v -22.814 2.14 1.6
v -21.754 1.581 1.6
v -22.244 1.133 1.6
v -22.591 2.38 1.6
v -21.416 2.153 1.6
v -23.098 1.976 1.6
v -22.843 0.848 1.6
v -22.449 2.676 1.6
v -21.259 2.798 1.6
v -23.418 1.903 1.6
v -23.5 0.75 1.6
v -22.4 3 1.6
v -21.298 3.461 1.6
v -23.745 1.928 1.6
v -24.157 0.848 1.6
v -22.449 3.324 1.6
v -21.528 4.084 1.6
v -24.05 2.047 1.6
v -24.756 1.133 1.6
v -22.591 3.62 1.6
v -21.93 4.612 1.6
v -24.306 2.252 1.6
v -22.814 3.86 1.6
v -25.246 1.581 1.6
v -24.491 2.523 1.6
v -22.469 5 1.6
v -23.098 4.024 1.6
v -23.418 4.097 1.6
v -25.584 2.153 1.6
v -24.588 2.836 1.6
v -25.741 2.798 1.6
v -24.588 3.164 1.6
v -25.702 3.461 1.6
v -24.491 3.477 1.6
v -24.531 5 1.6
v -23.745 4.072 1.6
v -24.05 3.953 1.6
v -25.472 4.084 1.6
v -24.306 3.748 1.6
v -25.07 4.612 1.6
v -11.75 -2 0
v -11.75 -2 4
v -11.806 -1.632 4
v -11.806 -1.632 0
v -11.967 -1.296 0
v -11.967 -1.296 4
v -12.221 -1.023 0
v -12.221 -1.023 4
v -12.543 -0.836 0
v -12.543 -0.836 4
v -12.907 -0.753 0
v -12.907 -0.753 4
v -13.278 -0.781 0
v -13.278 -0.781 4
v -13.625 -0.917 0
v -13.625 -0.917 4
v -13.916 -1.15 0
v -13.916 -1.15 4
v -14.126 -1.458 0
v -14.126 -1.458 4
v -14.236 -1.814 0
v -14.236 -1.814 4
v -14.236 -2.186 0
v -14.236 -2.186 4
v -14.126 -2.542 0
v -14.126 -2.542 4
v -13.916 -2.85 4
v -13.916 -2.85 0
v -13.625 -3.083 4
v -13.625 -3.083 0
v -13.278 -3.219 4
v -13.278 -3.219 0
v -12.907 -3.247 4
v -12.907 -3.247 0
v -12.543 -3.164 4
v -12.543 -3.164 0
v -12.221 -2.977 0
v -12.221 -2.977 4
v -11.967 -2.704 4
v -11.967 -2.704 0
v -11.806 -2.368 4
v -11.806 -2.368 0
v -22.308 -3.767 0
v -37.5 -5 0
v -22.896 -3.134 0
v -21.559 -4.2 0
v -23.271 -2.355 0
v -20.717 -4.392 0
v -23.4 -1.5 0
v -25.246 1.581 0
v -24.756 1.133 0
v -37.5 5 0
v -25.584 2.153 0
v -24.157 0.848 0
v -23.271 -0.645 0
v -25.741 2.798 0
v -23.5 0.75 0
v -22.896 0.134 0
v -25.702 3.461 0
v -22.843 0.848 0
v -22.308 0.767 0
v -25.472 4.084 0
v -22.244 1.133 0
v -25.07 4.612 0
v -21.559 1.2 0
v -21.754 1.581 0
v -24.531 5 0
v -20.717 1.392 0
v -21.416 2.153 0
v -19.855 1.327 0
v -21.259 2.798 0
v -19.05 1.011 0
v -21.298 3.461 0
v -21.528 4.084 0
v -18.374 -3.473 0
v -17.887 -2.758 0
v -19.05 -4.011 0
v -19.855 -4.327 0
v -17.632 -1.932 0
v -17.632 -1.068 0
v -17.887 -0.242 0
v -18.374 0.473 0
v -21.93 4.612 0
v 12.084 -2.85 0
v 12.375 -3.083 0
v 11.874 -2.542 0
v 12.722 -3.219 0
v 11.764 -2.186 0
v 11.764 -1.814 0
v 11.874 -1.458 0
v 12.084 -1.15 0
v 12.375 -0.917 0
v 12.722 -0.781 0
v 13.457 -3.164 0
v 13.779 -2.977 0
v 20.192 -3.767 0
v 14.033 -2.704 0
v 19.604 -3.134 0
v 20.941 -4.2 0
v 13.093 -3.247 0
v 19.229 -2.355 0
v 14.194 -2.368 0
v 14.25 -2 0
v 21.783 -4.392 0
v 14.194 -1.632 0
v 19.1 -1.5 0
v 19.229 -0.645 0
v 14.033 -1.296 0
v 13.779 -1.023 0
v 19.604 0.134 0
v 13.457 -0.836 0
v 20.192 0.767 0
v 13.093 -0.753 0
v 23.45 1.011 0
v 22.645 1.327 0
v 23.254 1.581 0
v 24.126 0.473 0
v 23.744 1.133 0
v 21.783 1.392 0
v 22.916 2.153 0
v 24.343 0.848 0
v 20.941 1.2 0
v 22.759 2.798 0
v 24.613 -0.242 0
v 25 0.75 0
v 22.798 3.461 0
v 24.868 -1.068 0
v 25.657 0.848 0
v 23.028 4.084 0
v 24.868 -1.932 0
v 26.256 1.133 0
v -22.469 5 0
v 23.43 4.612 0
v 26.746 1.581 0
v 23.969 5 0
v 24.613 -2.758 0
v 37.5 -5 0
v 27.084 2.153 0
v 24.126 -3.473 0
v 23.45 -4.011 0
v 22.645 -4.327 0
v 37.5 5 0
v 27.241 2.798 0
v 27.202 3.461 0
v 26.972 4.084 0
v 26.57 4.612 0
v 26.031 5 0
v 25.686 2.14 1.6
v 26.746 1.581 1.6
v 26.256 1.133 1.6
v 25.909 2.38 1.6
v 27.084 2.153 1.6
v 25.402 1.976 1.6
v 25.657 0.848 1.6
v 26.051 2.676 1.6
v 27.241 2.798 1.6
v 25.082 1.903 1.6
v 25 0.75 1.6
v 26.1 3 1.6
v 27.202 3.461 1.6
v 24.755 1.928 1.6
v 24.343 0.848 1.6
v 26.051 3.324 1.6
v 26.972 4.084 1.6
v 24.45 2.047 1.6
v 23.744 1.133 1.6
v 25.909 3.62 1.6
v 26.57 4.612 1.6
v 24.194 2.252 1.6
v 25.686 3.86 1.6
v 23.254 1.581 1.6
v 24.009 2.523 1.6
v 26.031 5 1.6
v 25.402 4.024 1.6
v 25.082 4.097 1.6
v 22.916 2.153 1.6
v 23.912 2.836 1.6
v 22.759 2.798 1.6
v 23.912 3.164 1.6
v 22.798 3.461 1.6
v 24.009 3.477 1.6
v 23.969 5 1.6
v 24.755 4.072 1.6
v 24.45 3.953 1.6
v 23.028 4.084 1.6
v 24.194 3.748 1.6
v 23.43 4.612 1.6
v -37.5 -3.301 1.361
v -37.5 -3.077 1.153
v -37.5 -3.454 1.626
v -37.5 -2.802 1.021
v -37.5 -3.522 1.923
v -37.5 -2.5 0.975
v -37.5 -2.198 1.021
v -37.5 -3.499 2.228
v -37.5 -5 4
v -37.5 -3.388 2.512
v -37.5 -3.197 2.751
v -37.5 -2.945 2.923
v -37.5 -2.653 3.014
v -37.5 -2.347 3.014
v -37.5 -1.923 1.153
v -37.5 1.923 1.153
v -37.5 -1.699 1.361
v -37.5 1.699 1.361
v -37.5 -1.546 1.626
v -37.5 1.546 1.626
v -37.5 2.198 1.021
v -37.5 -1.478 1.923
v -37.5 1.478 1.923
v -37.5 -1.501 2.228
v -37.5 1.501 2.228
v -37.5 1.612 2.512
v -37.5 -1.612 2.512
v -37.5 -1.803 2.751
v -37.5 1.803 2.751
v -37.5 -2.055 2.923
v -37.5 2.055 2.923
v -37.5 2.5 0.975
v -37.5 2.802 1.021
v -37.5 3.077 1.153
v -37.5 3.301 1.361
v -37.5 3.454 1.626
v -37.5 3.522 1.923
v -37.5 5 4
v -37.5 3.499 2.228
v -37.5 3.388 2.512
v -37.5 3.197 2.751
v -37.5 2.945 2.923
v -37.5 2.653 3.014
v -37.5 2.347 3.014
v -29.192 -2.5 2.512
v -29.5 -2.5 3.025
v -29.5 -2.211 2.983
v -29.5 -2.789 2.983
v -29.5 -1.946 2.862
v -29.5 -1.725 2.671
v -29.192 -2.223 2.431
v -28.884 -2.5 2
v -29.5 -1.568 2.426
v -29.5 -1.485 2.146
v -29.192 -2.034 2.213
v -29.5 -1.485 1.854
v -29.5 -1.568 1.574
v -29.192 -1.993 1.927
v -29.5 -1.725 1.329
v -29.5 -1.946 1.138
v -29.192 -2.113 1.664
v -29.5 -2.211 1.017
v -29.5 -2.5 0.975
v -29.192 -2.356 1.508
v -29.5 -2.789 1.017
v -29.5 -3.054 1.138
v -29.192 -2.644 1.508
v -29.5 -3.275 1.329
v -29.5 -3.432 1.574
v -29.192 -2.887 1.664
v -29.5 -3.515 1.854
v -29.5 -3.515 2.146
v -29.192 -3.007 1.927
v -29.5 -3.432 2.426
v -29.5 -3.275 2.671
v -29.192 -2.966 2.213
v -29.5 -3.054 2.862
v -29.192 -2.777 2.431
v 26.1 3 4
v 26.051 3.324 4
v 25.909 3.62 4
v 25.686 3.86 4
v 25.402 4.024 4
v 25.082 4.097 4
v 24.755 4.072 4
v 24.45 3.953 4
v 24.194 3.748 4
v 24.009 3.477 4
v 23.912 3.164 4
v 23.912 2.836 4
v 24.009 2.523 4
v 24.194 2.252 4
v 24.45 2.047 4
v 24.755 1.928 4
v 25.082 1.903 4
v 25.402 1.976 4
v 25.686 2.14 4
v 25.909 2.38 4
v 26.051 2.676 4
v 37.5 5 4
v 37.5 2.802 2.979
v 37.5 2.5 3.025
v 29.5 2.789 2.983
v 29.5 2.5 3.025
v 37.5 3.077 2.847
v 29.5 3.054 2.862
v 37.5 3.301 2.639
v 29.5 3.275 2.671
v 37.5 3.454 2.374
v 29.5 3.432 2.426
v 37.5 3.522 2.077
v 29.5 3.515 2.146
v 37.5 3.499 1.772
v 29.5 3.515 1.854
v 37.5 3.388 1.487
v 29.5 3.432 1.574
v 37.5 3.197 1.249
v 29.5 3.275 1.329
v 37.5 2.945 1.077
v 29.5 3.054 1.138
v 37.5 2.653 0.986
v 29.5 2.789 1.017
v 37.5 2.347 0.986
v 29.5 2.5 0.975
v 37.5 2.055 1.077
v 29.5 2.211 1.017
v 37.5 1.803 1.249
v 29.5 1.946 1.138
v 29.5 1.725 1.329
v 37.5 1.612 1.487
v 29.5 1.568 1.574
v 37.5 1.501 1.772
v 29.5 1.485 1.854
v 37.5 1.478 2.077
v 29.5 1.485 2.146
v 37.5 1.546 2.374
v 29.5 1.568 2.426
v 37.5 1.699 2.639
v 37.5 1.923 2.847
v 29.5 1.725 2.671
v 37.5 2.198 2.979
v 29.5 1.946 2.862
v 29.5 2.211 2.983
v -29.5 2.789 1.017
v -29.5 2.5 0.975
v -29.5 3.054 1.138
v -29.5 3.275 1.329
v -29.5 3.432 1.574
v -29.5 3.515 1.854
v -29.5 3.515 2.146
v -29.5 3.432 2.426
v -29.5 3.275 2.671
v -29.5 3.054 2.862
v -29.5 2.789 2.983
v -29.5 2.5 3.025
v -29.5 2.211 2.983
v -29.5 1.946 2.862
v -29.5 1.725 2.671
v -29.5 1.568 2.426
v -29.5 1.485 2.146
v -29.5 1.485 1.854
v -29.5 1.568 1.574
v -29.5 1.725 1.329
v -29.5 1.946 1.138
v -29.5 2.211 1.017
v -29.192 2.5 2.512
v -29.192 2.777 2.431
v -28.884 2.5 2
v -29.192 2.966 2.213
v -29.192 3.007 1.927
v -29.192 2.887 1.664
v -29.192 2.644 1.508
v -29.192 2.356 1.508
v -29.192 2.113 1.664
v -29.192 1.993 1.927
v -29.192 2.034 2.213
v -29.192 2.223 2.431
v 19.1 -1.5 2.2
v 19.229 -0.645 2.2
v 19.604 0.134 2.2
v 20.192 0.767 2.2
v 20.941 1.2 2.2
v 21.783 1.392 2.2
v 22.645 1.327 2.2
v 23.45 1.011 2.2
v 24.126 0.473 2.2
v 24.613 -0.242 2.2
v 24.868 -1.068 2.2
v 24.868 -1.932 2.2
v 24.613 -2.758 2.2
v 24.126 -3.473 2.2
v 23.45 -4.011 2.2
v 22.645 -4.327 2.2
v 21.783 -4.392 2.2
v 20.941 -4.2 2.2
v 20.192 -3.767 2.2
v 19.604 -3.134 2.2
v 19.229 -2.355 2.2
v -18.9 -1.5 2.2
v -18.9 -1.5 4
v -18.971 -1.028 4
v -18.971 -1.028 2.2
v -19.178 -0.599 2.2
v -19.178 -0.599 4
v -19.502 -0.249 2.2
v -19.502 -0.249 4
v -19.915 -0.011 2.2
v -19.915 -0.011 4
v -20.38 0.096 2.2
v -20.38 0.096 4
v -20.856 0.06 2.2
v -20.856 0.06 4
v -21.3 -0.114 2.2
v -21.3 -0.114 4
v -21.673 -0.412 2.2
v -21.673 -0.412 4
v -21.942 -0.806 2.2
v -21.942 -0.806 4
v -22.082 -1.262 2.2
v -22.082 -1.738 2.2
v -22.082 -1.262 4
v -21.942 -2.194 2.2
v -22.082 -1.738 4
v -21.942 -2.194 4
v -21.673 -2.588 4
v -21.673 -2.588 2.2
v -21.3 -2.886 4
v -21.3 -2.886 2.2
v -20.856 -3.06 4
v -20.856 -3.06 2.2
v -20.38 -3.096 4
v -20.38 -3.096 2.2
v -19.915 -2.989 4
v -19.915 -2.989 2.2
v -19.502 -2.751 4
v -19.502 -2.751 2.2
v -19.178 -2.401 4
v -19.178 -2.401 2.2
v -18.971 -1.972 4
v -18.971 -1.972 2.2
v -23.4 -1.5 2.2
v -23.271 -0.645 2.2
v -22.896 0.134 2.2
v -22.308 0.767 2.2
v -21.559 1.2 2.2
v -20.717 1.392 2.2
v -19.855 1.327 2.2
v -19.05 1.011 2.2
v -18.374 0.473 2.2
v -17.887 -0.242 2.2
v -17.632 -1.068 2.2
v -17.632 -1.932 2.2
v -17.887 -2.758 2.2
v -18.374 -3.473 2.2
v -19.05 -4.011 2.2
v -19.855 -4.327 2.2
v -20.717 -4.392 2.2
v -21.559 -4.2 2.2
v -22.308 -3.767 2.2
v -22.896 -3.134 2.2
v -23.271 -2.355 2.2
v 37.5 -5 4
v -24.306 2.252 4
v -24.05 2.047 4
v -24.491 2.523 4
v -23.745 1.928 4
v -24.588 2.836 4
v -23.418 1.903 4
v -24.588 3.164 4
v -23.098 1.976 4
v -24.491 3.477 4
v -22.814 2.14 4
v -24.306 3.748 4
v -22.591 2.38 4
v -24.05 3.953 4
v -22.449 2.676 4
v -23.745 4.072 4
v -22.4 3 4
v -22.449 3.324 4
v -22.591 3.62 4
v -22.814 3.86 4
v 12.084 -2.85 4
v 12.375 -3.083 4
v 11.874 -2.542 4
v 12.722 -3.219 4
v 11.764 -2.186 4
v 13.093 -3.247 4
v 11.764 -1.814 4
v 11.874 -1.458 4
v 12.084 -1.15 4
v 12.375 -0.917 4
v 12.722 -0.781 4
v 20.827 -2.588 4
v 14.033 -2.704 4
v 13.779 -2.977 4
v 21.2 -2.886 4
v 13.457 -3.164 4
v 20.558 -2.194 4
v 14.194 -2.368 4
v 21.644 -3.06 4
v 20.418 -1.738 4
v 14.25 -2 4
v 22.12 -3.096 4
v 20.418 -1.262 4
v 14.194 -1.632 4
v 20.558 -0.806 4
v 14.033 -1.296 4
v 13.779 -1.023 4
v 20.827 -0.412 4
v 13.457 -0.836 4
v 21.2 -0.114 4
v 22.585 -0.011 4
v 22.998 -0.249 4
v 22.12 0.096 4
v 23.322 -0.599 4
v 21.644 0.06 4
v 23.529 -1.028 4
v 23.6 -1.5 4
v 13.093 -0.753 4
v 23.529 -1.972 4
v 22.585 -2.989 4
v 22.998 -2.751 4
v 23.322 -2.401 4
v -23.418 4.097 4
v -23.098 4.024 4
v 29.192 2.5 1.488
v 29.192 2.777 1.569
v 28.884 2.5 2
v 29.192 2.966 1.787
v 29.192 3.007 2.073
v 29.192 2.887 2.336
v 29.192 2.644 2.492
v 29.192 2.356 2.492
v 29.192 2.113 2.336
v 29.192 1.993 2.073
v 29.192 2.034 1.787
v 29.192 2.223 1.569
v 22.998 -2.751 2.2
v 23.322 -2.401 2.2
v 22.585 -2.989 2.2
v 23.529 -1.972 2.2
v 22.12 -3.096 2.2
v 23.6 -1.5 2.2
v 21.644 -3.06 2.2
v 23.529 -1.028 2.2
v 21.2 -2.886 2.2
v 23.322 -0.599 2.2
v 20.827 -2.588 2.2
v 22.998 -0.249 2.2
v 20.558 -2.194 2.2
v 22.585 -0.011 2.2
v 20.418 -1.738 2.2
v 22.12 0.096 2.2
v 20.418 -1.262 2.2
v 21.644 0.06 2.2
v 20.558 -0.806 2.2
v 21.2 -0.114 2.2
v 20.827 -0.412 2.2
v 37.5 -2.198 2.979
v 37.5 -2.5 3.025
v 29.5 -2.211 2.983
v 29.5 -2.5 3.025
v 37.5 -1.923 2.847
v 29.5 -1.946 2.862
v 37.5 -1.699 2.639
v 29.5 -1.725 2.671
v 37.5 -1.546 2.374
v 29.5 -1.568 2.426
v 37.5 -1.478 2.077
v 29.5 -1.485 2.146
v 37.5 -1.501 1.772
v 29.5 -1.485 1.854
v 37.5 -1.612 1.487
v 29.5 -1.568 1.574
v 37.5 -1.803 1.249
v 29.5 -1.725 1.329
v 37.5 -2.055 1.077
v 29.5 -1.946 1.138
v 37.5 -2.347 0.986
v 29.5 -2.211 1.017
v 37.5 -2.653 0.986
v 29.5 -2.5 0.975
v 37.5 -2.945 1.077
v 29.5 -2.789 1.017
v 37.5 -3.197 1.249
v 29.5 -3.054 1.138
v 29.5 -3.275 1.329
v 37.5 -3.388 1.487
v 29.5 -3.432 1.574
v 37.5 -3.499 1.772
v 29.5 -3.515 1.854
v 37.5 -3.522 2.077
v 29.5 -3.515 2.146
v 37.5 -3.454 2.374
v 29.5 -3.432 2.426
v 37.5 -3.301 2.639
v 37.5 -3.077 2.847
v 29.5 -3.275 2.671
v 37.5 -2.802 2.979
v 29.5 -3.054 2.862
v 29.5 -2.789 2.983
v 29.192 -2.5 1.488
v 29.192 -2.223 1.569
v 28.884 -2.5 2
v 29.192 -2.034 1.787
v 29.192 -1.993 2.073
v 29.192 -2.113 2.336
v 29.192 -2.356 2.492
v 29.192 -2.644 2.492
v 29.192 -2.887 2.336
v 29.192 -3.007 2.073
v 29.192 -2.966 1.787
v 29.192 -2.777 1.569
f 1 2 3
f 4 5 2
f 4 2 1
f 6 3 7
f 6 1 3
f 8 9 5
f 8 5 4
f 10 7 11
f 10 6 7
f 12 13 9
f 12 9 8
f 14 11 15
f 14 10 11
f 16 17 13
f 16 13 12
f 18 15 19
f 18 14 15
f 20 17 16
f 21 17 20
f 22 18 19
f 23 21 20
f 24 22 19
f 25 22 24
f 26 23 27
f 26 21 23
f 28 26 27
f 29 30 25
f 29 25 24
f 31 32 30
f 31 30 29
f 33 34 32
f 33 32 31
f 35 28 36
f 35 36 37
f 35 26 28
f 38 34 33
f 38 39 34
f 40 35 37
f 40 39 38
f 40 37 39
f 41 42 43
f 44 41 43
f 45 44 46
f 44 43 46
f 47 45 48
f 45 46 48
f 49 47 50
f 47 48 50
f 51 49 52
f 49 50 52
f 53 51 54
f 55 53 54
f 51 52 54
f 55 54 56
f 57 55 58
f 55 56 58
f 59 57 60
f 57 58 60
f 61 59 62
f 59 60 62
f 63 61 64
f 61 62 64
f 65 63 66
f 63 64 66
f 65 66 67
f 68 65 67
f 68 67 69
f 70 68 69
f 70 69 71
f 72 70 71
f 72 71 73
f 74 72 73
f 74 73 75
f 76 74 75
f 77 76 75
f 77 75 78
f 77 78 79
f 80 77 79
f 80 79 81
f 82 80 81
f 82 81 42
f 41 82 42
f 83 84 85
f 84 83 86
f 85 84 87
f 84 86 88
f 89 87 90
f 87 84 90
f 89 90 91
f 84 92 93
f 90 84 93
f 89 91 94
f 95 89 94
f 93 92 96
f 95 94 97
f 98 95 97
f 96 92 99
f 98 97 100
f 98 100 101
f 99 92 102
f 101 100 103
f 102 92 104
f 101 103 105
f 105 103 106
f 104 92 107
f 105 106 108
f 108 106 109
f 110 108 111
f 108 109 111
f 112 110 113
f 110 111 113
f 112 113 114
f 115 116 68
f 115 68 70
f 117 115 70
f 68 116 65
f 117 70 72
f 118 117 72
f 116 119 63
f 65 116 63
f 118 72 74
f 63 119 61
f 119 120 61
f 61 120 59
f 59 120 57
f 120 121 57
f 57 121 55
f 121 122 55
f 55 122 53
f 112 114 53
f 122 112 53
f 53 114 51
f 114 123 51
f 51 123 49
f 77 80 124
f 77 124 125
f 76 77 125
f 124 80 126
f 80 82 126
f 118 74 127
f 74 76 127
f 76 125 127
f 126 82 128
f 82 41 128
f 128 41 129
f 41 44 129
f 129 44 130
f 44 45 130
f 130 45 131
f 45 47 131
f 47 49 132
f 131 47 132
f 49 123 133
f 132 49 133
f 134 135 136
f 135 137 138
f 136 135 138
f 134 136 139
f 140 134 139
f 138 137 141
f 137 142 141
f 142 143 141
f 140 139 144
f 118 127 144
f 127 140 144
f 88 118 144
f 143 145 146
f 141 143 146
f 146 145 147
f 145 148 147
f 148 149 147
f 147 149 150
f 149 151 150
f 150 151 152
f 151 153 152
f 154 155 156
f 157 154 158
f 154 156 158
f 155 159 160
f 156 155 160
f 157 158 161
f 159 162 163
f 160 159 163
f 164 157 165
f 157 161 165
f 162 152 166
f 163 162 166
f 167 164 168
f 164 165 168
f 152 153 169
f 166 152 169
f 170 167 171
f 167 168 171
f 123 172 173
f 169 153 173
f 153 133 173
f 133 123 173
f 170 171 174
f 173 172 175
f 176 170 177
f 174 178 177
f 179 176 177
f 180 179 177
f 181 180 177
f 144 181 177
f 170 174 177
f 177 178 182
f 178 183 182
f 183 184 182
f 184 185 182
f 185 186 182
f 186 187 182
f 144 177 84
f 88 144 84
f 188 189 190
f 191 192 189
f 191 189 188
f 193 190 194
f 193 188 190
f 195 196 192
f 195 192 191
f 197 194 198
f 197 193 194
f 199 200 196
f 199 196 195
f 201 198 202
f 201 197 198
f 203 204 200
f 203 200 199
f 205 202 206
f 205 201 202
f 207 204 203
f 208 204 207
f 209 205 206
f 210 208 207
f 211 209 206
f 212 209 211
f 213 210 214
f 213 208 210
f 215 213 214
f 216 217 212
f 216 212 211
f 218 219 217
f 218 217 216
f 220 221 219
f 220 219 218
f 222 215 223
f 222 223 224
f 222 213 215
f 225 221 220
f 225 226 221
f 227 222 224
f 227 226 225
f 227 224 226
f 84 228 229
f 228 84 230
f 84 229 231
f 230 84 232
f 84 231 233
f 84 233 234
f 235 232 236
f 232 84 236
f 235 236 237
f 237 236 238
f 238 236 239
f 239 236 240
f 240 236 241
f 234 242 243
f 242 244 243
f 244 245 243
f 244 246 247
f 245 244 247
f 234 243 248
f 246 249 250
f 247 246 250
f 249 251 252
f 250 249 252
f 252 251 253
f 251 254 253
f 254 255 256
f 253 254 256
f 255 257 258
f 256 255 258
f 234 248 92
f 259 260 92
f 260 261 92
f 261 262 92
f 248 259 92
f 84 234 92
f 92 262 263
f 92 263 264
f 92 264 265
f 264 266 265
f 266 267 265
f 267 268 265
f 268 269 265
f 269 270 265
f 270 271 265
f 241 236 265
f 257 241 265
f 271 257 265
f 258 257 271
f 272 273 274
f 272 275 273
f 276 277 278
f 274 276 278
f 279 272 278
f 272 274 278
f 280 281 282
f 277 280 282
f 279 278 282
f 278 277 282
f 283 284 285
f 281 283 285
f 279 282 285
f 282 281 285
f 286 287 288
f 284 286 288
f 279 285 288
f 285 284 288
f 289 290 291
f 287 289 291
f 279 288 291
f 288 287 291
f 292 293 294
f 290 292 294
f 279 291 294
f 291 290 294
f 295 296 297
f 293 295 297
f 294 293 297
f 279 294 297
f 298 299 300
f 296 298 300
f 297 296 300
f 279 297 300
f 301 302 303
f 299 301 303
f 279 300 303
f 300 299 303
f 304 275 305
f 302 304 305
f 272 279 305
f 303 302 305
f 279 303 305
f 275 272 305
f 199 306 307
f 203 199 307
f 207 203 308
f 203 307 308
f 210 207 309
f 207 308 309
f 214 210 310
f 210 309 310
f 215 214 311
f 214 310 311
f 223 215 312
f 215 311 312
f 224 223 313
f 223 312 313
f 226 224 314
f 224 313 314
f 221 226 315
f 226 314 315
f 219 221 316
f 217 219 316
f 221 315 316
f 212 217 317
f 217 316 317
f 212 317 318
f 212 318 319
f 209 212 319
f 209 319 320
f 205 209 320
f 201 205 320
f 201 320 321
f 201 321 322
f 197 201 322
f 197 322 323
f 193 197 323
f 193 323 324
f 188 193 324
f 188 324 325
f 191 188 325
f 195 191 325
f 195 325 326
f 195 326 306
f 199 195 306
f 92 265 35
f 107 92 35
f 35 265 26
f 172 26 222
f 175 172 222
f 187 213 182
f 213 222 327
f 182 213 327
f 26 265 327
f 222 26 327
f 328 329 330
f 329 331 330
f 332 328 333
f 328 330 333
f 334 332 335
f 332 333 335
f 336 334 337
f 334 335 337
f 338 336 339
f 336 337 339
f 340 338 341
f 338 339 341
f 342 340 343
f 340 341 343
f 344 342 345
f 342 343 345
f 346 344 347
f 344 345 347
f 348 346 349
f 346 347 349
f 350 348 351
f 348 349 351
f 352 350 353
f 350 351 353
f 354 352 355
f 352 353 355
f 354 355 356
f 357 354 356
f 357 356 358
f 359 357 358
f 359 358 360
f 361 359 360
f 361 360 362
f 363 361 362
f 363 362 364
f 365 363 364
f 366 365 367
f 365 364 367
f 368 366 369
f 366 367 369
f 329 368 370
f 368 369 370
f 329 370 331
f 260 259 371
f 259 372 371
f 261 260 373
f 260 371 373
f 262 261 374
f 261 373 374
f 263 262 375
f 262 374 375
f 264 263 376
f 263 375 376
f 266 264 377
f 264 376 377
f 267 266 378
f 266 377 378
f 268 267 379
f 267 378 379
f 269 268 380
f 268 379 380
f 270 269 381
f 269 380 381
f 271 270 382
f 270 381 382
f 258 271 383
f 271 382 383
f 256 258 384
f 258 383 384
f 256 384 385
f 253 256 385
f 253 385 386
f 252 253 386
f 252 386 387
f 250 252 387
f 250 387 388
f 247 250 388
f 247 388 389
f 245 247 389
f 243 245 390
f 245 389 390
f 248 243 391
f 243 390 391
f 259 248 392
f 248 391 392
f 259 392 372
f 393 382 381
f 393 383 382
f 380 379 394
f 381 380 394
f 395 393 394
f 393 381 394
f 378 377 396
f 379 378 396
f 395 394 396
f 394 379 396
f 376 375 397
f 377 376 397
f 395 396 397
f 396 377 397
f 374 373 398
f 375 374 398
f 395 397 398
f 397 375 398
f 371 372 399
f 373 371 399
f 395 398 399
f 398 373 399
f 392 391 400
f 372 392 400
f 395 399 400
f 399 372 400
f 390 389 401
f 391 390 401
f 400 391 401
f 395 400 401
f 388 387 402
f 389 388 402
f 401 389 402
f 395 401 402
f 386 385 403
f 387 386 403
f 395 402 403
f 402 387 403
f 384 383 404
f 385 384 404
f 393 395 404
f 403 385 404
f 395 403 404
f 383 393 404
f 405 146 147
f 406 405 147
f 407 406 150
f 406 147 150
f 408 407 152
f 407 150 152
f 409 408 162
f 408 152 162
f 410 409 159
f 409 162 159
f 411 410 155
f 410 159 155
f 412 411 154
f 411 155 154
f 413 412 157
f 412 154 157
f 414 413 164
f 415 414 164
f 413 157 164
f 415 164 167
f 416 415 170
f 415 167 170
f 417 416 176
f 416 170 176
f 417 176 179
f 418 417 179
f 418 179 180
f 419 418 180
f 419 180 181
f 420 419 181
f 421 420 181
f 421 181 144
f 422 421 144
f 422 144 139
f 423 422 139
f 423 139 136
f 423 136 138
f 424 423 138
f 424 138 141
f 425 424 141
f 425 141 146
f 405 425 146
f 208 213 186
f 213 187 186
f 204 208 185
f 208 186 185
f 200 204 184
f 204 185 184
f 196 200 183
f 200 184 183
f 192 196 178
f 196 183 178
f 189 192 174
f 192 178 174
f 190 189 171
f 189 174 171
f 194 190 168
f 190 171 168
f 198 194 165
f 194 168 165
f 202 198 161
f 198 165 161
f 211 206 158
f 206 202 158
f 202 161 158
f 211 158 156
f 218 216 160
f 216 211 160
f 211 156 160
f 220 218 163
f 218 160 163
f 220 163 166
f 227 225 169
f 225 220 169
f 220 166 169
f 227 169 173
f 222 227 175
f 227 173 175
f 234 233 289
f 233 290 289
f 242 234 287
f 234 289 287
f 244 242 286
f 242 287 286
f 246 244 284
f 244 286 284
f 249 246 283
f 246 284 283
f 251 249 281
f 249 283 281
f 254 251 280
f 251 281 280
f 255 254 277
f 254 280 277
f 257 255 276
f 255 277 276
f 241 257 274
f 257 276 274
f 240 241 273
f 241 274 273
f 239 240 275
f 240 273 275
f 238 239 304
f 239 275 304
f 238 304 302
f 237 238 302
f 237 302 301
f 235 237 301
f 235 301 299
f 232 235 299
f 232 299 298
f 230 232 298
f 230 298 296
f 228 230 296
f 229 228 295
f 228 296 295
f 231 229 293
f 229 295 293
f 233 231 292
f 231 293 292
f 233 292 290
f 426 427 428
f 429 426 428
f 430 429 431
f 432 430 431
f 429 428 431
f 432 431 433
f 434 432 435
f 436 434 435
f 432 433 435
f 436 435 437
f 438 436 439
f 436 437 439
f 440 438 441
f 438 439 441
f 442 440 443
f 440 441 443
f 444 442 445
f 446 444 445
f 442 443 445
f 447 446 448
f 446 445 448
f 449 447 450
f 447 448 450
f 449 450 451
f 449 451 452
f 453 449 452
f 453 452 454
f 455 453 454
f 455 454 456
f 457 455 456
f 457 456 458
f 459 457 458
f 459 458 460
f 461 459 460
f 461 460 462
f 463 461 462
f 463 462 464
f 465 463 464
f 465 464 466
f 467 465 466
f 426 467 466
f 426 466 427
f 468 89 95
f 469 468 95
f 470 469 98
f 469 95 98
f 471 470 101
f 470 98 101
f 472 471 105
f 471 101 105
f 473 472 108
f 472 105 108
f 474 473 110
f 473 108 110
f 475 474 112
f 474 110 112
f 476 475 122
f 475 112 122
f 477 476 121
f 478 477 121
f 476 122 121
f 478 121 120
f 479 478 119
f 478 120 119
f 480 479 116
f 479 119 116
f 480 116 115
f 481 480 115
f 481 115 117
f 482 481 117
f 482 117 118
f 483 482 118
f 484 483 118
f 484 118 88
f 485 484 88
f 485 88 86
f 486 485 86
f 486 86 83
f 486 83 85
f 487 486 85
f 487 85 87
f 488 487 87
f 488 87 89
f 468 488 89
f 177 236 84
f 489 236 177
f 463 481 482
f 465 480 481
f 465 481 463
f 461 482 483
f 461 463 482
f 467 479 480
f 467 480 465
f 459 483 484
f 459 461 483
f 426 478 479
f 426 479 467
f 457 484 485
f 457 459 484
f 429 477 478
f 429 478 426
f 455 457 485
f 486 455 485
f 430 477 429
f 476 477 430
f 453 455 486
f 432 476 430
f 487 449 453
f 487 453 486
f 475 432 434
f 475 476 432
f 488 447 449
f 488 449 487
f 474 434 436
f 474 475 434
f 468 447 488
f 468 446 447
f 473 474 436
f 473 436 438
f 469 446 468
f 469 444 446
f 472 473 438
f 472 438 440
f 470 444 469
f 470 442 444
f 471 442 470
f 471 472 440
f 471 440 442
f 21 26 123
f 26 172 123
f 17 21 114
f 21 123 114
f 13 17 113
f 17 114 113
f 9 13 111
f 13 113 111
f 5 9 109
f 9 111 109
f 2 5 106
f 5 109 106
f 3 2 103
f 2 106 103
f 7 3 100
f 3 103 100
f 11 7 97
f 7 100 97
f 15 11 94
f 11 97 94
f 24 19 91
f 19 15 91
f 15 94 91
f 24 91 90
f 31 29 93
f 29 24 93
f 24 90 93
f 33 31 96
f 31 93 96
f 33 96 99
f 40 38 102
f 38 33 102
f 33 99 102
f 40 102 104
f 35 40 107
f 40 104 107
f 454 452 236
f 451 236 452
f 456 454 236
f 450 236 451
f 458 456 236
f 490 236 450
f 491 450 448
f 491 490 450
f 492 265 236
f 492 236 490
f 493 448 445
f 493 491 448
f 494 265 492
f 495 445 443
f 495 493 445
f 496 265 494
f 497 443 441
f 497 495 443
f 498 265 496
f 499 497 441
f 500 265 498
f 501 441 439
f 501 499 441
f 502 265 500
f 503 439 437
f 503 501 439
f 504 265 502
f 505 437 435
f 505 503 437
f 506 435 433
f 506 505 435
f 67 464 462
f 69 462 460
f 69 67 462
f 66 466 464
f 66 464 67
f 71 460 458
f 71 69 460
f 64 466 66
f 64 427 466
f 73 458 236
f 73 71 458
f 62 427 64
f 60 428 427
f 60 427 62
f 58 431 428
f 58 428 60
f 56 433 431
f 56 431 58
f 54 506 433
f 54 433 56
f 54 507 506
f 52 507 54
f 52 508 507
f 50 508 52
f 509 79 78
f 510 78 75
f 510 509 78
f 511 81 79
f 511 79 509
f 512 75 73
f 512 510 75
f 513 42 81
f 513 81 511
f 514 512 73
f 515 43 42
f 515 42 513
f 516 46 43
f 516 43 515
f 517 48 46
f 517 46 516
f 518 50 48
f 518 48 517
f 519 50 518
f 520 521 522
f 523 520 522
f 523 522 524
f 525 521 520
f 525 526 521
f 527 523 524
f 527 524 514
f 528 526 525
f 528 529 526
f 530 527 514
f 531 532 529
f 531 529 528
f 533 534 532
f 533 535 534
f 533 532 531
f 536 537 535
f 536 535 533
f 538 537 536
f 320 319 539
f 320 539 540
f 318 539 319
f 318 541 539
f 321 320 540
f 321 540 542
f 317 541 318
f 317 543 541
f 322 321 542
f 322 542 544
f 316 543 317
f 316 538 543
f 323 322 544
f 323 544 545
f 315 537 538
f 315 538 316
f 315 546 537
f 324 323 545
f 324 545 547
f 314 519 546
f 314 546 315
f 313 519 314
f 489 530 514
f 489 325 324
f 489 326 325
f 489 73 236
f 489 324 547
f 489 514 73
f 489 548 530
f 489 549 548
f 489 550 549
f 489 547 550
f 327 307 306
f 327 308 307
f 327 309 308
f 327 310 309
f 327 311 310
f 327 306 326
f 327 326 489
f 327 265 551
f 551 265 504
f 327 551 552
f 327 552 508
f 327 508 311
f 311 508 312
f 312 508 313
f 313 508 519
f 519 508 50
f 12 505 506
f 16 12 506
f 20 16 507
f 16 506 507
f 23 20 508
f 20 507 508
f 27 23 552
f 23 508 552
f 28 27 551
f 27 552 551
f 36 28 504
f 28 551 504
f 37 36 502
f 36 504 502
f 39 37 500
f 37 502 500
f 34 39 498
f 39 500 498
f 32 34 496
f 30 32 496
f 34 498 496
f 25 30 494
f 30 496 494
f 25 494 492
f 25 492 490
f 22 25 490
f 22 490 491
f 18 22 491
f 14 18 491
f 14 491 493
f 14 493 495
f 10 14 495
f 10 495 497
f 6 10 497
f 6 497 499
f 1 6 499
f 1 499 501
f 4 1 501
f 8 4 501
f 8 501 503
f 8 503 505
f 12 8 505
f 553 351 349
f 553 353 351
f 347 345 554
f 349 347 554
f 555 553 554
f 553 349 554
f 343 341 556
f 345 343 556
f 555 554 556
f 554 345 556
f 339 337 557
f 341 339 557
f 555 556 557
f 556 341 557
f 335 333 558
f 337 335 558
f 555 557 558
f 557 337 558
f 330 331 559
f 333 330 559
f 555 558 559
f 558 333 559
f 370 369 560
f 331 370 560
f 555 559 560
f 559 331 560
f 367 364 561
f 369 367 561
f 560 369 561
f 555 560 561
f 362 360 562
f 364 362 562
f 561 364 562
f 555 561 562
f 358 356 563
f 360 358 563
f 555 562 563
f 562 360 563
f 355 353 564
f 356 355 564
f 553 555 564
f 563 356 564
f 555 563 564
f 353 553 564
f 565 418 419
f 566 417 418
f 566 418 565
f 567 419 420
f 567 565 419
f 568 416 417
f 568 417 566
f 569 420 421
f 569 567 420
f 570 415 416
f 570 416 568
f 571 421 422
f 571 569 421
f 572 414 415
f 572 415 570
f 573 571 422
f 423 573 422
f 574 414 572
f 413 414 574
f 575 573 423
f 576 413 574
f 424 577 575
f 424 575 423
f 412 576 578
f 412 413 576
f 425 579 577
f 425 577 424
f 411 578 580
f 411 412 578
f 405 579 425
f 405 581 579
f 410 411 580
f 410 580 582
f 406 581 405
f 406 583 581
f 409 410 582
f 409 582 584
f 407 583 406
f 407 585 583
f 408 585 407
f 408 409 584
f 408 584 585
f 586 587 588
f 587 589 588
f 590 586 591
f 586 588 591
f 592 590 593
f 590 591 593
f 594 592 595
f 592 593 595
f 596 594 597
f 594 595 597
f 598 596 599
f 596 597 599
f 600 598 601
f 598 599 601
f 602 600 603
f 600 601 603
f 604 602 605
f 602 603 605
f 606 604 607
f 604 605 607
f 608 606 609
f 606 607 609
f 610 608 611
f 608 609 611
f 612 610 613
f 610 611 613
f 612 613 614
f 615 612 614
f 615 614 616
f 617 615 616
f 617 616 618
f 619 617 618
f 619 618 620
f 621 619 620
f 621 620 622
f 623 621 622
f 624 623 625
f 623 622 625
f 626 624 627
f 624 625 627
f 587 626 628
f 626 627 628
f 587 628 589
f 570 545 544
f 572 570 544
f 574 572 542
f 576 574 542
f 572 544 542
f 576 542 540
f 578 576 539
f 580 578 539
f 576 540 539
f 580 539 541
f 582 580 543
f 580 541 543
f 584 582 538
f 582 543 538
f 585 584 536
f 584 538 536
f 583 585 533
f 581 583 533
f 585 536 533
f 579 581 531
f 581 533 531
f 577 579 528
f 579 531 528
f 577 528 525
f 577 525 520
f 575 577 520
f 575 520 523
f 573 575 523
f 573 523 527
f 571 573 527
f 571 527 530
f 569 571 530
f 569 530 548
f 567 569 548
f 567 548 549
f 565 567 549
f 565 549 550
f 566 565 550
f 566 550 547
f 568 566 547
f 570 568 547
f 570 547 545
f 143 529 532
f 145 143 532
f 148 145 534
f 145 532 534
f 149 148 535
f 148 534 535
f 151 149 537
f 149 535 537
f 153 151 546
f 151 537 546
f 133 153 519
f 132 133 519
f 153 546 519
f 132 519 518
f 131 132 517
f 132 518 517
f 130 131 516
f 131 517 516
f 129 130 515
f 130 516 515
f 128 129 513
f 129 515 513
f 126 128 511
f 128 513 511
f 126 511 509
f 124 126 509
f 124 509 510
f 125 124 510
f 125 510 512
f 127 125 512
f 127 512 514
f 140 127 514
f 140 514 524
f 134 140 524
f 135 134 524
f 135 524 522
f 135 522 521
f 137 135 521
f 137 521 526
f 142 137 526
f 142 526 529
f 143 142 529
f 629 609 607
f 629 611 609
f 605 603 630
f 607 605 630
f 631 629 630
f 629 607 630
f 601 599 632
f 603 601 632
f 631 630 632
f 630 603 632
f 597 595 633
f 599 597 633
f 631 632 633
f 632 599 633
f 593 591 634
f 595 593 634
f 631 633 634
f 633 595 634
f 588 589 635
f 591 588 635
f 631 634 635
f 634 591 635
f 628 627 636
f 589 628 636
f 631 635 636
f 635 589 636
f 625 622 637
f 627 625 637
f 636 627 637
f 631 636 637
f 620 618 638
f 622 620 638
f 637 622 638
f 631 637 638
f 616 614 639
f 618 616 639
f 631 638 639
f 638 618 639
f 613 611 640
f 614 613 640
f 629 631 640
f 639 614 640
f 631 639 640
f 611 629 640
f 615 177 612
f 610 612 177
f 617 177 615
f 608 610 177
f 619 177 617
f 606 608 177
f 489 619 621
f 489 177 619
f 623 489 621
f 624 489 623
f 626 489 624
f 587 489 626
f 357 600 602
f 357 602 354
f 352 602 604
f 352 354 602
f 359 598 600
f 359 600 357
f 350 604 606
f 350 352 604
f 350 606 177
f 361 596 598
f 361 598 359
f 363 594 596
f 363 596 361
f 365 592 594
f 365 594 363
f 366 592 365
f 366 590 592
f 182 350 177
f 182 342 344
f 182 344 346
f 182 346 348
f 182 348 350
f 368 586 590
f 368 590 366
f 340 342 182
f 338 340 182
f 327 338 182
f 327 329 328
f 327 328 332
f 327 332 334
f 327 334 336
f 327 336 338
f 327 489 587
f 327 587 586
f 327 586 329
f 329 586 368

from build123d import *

# Parameters (mm, degrees)
SKETCH1_W                                        = 75
SKETCH1_H                                        = 10
BOSS_EXTRUDE1_DEPTH                              = 4
F_2_5_2_5_DIAMETER_HOLE1_D                       = 2.5
F_2_5_2_5_DIAMETER_HOLE1_DEPTH                   = 4
CBORE_FOR_M3_HEX_HEAD_MACHINE_SCREW1_D           = 3.2
CBORE_FOR_M3_HEX_HEAD_MACHINE_SCREW1_DEPTH       = 4
CBORE_FOR_M3_HEX_HEAD_MACHINE_SCREW1_CBORE_D     = 5.8
CBORE_FOR_M3_HEX_HEAD_MACHINE_SCREW1_CBORE_DEPTH = 2.2
CBORE_FOR_M2_HEX_HEAD_MACHINE_SCREW1_D           = 2.2
CBORE_FOR_M2_HEX_HEAD_MACHINE_SCREW1_DEPTH       = 4
CBORE_FOR_M2_HEX_HEAD_MACHINE_SCREW1_CBORE_D     = 4.499999997
CBORE_FOR_M2_HEX_HEAD_MACHINE_SCREW1_CBORE_DEPTH = 1.6
F_2_05_2_05_DIAMETER_HOLE1_D                     = 2.05
F_2_05_2_05_DIAMETER_HOLE1_DEPTH                 = 8
F_2_05_2_05_DIAMETER_HOLE1_TIP                   = 0.615882135
F_2_05_2_05_DIAMETER_HOLE2_D                     = 2.05
F_2_05_2_05_DIAMETER_HOLE2_DEPTH                 = 8
F_2_05_2_05_DIAMETER_HOLE2_TIP                   = 0.615882135


with BuildPart() as part:
    # Sketch1 → Boss-Extrude1 (new body)
    with BuildSketch(Plane.XY.offset(4)):
        Rectangle(SKETCH1_W, SKETCH1_H)
    extrude(amount=-BOSS_EXTRUDE1_DEPTH)

    # Ø2.5 (2.5) Diameter Hole1
    with Locations(Plane(origin=(0, 0, 0), x_dir=(-1, 0, 0), z_dir=(0, 0, -1))):
        with Locations((-13, -2), (13, -2)):
            Hole(F_2_5_2_5_DIAMETER_HOLE1_D / 2, depth=F_2_5_2_5_DIAMETER_HOLE1_DEPTH)

    # CBORE for M3 Hex Head Machine Screw1
    with Locations(Plane(origin=(0, 0, 0), x_dir=(-1, 0, 0), z_dir=(0, 0, -1))):
        with Locations((-22, -1.5), (20.5, -1.5)):
            CounterBoreHole(CBORE_FOR_M3_HEX_HEAD_MACHINE_SCREW1_D / 2, CBORE_FOR_M3_HEX_HEAD_MACHINE_SCREW1_CBORE_D / 2, CBORE_FOR_M3_HEX_HEAD_MACHINE_SCREW1_CBORE_DEPTH, depth=CBORE_FOR_M3_HEX_HEAD_MACHINE_SCREW1_DEPTH)

    # CBORE for M2 Hex Head Machine Screw1
    with Locations(Plane(origin=(0, 0, 0), x_dir=(-1, 0, 0), z_dir=(0, 0, -1))):
        with Locations((23.5, 3), (-25, 3)):
            CounterBoreHole(CBORE_FOR_M2_HEX_HEAD_MACHINE_SCREW1_D / 2, CBORE_FOR_M2_HEX_HEAD_MACHINE_SCREW1_CBORE_D / 2, CBORE_FOR_M2_HEX_HEAD_MACHINE_SCREW1_CBORE_DEPTH, depth=CBORE_FOR_M2_HEX_HEAD_MACHINE_SCREW1_DEPTH)

    # Ø2.05 (2.05) Diameter Hole1
    with Locations(Plane(origin=(37.5, 0, 0), x_dir=(0, 0, -1), z_dir=(1, 0, 0))):
        with Locations((-2, 2.5), (-2, -2.5)):
            Hole(F_2_05_2_05_DIAMETER_HOLE1_D / 2, depth=F_2_05_2_05_DIAMETER_HOLE1_DEPTH)
            with Locations((0, 0, -(F_2_05_2_05_DIAMETER_HOLE1_DEPTH + F_2_05_2_05_DIAMETER_HOLE1_TIP / 2))):  # 118° drill point
                Cone(0, F_2_05_2_05_DIAMETER_HOLE1_D / 2, F_2_05_2_05_DIAMETER_HOLE1_TIP, mode=Mode.SUBTRACT)

    # Ø2.05 (2.05) Diameter Hole2
    with Locations(Plane.ZY.offset(37.5)):
        with Locations((2, -2.5), (2, 2.5)):
            Hole(F_2_05_2_05_DIAMETER_HOLE2_D / 2, depth=F_2_05_2_05_DIAMETER_HOLE2_DEPTH)
            with Locations((0, 0, -(F_2_05_2_05_DIAMETER_HOLE2_DEPTH + F_2_05_2_05_DIAMETER_HOLE2_TIP / 2))):  # 118° drill point
                Cone(0, F_2_05_2_05_DIAMETER_HOLE2_D / 2, F_2_05_2_05_DIAMETER_HOLE2_TIP, mode=Mode.SUBTRACT)


solid = part.part
